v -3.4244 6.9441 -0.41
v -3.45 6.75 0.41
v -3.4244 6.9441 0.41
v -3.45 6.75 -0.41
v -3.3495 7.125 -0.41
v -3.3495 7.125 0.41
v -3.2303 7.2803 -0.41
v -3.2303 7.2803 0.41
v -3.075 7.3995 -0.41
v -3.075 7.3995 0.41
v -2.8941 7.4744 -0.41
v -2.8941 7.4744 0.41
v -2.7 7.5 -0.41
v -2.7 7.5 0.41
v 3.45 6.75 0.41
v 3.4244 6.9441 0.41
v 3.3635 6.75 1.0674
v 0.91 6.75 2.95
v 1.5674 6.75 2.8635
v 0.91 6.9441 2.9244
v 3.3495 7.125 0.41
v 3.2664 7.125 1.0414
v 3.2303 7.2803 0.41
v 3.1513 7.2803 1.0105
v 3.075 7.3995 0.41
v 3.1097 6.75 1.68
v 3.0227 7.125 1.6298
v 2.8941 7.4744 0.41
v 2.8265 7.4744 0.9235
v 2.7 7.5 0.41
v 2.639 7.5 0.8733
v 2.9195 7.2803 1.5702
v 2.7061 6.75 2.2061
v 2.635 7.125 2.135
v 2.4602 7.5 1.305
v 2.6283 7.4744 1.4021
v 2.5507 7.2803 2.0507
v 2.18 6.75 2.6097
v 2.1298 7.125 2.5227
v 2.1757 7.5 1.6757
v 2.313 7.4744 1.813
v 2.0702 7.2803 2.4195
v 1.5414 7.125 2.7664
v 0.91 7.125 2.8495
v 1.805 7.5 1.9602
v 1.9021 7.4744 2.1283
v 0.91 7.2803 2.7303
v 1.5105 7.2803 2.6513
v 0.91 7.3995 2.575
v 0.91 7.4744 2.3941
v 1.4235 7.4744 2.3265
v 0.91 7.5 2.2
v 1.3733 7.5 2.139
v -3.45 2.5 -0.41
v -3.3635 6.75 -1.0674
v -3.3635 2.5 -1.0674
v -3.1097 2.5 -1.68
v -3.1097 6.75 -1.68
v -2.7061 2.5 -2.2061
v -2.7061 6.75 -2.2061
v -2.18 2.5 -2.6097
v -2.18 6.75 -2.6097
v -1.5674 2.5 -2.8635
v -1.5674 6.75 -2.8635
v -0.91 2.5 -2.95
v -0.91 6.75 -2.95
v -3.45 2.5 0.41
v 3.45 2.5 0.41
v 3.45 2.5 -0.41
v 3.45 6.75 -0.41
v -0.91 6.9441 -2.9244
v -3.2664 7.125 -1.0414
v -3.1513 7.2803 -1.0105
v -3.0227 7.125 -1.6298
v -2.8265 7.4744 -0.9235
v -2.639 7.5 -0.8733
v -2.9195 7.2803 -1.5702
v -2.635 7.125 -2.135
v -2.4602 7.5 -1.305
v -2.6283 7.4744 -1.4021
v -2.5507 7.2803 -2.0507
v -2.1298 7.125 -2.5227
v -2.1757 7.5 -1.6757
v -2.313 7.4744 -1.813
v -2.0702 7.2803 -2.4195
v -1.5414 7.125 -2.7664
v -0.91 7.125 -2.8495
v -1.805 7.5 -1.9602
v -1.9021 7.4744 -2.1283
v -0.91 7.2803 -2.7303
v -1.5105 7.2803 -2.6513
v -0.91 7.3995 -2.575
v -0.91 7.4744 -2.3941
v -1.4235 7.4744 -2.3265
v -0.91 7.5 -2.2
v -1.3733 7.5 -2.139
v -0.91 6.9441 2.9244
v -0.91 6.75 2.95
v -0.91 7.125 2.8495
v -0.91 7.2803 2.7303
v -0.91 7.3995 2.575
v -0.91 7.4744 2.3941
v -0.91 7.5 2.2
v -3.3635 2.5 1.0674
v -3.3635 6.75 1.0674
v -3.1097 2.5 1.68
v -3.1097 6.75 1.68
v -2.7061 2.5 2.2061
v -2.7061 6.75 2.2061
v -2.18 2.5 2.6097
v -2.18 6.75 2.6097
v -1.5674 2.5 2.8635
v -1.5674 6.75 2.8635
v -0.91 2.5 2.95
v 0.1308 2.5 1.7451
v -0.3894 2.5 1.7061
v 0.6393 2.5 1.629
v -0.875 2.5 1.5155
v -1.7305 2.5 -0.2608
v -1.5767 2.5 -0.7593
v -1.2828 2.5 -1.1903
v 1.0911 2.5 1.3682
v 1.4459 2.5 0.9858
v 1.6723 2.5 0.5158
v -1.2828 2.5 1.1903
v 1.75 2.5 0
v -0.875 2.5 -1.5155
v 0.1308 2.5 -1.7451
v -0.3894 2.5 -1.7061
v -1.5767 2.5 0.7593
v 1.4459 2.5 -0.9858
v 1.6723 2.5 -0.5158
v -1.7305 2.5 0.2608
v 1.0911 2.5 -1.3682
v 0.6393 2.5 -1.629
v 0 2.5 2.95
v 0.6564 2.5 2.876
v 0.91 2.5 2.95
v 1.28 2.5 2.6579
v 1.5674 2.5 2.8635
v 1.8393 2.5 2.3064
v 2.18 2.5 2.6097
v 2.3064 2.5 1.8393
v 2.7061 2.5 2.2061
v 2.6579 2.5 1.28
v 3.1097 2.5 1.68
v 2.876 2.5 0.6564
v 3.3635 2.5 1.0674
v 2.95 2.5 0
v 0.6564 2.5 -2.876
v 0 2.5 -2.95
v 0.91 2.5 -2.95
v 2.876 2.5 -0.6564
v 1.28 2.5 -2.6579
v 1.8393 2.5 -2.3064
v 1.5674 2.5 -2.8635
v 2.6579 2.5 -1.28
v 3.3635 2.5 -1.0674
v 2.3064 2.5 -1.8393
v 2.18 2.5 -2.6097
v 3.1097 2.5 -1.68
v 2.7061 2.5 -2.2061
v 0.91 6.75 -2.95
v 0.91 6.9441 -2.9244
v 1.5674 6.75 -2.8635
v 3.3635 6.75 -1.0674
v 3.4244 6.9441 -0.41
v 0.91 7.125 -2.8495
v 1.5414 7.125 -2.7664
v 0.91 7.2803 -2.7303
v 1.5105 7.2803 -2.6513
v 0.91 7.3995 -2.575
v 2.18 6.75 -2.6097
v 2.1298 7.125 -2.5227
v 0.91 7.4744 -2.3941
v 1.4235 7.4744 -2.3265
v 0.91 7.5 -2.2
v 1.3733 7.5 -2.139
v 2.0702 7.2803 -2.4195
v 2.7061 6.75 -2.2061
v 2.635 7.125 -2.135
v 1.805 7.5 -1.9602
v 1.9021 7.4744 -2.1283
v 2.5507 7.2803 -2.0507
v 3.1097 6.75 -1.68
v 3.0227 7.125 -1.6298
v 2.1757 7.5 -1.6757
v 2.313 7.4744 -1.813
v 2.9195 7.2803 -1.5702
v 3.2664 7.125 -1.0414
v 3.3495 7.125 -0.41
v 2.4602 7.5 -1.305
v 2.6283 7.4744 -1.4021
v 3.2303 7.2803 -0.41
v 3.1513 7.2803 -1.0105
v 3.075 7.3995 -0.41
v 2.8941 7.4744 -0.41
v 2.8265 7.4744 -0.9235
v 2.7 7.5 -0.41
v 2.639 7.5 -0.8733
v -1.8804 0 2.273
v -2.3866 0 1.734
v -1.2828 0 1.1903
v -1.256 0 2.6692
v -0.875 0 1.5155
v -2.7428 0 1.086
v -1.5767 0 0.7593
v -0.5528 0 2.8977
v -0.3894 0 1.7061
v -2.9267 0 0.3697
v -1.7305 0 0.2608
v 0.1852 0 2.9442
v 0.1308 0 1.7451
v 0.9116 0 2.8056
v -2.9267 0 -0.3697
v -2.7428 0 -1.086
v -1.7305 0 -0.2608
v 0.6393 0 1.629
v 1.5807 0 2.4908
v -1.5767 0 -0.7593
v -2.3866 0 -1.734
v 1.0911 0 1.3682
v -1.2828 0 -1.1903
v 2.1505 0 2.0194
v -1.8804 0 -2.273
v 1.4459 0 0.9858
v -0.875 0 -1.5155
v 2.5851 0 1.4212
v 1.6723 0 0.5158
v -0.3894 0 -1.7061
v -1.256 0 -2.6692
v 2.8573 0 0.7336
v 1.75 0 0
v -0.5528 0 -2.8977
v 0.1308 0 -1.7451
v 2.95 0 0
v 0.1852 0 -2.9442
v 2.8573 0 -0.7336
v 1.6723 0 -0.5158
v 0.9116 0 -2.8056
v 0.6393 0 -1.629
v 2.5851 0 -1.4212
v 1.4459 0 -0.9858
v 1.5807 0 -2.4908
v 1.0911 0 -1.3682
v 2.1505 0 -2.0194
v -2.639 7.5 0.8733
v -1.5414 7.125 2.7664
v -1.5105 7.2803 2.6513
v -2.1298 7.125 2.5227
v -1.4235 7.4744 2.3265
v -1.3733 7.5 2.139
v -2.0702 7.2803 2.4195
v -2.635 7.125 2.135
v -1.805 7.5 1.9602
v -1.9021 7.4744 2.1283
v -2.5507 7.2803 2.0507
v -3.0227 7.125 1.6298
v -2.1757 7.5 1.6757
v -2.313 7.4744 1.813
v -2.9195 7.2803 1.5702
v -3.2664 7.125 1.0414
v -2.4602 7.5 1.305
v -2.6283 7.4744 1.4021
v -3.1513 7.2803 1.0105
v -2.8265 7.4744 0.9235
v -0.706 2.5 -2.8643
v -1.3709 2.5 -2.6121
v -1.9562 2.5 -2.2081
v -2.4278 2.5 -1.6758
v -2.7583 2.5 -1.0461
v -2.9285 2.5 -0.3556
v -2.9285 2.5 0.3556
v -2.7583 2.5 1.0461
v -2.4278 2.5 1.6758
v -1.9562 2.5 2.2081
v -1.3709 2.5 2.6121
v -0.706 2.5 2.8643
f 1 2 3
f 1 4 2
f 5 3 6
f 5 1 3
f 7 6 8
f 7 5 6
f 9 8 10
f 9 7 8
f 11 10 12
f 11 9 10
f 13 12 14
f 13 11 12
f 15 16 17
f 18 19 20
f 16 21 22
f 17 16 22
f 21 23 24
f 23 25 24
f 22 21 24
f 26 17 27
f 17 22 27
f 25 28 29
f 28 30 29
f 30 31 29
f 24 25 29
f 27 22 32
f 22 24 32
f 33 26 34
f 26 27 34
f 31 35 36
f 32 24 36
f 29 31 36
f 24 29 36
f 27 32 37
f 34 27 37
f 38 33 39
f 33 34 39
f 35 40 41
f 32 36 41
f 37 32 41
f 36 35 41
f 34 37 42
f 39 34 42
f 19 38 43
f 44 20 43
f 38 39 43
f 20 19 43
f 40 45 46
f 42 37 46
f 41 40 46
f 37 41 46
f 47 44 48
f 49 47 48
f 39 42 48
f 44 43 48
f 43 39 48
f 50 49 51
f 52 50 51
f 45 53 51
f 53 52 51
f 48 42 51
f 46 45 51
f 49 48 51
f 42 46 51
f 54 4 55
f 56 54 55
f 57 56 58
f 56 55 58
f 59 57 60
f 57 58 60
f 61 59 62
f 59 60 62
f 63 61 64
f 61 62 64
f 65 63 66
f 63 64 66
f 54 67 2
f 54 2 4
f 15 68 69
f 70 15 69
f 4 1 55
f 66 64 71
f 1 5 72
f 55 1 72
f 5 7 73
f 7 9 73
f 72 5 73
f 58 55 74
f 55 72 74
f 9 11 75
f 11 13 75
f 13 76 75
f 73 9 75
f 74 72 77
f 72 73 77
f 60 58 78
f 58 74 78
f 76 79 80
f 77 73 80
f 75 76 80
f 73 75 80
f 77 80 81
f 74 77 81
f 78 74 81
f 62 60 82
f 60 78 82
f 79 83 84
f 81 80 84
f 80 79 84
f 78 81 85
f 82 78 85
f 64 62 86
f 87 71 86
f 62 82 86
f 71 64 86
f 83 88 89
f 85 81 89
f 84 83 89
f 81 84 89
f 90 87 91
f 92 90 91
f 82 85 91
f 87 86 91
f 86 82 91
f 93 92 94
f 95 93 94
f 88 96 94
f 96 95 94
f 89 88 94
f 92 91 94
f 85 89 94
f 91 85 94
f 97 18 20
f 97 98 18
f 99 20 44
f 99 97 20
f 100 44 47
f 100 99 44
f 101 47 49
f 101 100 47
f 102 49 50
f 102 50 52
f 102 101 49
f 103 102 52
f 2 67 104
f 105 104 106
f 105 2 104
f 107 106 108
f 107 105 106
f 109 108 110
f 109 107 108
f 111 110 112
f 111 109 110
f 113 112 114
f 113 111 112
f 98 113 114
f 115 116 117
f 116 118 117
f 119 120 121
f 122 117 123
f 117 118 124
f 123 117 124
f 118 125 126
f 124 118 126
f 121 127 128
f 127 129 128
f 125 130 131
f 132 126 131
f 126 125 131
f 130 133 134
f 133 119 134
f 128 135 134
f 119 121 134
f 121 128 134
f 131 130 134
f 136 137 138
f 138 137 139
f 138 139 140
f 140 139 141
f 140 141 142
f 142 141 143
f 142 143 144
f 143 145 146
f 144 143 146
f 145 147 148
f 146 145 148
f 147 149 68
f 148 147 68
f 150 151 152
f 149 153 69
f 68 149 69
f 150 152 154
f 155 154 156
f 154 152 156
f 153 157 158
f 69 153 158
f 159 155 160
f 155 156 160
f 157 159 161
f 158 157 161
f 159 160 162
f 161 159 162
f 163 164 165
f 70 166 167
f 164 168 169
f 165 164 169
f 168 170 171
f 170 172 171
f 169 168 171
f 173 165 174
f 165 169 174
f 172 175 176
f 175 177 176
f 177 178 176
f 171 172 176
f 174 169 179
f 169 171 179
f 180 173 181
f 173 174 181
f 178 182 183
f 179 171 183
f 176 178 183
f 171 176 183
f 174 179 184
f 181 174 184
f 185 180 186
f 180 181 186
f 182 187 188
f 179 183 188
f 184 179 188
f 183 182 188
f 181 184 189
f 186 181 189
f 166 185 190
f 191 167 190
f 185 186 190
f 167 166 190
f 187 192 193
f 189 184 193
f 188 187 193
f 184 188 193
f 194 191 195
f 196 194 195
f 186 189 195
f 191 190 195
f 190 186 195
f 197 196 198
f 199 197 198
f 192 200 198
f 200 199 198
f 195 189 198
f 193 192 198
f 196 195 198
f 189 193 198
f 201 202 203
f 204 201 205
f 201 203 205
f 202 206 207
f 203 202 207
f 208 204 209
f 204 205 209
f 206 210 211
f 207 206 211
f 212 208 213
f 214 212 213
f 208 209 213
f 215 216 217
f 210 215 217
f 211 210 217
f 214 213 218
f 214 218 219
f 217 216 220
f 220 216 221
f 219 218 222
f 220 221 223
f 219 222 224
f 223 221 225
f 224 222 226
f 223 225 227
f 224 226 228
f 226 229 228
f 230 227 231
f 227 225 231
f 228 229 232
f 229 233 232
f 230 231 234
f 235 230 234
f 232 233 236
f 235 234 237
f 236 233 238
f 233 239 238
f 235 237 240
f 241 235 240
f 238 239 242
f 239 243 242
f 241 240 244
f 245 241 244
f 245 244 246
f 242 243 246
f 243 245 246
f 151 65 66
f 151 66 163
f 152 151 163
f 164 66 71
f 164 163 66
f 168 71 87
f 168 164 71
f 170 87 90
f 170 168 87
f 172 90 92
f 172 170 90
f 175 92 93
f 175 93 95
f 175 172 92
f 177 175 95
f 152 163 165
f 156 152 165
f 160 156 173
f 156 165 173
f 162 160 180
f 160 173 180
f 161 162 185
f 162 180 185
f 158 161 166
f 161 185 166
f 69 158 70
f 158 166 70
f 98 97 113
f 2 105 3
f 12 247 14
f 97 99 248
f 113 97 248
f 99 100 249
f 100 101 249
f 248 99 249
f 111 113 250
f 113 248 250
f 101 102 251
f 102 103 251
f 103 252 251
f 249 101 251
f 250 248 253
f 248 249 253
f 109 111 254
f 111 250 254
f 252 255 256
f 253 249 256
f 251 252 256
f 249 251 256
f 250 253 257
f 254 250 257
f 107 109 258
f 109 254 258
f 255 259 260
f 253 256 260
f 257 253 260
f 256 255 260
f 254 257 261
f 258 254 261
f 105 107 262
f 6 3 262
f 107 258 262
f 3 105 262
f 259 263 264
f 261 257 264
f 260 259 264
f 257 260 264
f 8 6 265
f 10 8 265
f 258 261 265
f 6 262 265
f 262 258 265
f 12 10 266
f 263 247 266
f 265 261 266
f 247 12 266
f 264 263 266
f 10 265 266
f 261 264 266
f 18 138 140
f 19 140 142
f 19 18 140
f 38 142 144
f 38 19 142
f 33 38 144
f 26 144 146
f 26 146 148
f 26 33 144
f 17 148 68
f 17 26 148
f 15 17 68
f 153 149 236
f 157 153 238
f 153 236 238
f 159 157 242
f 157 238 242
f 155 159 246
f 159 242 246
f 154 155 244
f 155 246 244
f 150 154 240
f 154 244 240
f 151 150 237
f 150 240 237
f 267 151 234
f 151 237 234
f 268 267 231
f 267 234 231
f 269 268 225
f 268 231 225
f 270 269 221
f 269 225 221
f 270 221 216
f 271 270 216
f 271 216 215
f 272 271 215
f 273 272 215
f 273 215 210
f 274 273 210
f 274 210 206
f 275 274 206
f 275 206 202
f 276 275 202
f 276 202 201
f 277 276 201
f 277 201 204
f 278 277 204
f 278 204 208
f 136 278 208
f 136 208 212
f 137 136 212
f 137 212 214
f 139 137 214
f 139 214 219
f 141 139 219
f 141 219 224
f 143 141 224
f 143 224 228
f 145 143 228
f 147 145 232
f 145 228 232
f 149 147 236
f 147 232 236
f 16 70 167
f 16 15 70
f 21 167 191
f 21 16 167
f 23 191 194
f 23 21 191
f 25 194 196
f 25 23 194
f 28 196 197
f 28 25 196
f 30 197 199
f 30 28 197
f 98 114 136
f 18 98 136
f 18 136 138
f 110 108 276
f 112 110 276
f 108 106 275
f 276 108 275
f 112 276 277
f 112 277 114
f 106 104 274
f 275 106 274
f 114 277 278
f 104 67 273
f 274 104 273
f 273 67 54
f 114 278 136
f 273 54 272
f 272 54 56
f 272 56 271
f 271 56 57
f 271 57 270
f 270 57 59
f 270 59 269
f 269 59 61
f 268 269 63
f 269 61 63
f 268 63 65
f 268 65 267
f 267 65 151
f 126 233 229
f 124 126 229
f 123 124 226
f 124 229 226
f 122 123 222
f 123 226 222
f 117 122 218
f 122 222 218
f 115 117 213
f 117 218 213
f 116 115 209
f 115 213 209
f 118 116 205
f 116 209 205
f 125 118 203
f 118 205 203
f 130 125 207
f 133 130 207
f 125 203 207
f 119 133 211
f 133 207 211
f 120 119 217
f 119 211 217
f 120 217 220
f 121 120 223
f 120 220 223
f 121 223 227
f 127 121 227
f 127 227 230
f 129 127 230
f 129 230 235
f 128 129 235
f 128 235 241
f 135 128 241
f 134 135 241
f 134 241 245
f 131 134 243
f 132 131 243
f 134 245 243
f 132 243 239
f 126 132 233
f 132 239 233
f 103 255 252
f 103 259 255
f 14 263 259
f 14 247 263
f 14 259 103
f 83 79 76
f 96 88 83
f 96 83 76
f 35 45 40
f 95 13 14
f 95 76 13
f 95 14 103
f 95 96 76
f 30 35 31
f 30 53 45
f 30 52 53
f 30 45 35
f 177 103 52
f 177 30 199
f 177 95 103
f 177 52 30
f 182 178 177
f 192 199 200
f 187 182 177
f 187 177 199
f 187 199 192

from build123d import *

# Parameters (mm, degrees)
SKETCH1_R           = 2.95
BOSS_EXTRUDE1_DEPTH = 2.5
SKETCH2_R           = 1.75
CUT_EXTRUDE1_DEPTH  = 2.5
SKETCH3_W           = 6.9
SKETCH3_H           = 5.9
BOSS_EXTRUDE2_DEPTH = 5
FILLET1_R           = 2.54
FILLET2_R           = 0.75


with BuildPart() as part:
    # Sketch1 → Boss-Extrude1 (new body)
    with BuildSketch(Plane(origin=(0, 0, 0), x_dir=(1, 0, 0), z_dir=(0, 1, 0))):
        Circle(SKETCH1_R)
    extrude(amount=BOSS_EXTRUDE1_DEPTH)

    # Sketch2 → Cut-Extrude1 (cut)
    with BuildSketch(Plane.XZ):
        Circle(SKETCH2_R)
    extrude(amount=-CUT_EXTRUDE1_DEPTH, mode=Mode.SUBTRACT)

    # Sketch3 → Boss-Extrude2 (add)
    with BuildSketch(Plane(origin=(0, 2.5, 0), x_dir=(1, 0, 0), z_dir=(0, 1, 0))):
        Rectangle(SKETCH3_W, SKETCH3_H)
    extrude(amount=BOSS_EXTRUDE2_DEPTH)

    # Fillet1
    fillet1_edges = [part.edges().sort_by_distance(p)[0] for p in [
        (3.45, 5, 2.95),
        (3.45, 5, -2.95),
        (-3.45, 5, -2.95),
        (-3.45, 5, 2.95),
    ]]
    fillet(fillet1_edges, radius=FILLET1_R)

    # Fillet2
    fillet2_edges = [part.edges().sort_by_distance(p)[0] for p in [
        (-3.45, 7.5, 0),
        (0, 7.5, -2.95),
        (3.45, 7.5, 0),
        (0, 7.5, 2.95),
        (-2.706051224, 7.5, 2.206051224),
        (2.706051224, 7.5, 2.206051224),
        (2.706051224, 7.5, -2.206051224),
        (-2.706051224, 7.5, -2.206051224),
    ]]
    fillet(fillet2_edges, radius=FILLET2_R)


solid = part.part
